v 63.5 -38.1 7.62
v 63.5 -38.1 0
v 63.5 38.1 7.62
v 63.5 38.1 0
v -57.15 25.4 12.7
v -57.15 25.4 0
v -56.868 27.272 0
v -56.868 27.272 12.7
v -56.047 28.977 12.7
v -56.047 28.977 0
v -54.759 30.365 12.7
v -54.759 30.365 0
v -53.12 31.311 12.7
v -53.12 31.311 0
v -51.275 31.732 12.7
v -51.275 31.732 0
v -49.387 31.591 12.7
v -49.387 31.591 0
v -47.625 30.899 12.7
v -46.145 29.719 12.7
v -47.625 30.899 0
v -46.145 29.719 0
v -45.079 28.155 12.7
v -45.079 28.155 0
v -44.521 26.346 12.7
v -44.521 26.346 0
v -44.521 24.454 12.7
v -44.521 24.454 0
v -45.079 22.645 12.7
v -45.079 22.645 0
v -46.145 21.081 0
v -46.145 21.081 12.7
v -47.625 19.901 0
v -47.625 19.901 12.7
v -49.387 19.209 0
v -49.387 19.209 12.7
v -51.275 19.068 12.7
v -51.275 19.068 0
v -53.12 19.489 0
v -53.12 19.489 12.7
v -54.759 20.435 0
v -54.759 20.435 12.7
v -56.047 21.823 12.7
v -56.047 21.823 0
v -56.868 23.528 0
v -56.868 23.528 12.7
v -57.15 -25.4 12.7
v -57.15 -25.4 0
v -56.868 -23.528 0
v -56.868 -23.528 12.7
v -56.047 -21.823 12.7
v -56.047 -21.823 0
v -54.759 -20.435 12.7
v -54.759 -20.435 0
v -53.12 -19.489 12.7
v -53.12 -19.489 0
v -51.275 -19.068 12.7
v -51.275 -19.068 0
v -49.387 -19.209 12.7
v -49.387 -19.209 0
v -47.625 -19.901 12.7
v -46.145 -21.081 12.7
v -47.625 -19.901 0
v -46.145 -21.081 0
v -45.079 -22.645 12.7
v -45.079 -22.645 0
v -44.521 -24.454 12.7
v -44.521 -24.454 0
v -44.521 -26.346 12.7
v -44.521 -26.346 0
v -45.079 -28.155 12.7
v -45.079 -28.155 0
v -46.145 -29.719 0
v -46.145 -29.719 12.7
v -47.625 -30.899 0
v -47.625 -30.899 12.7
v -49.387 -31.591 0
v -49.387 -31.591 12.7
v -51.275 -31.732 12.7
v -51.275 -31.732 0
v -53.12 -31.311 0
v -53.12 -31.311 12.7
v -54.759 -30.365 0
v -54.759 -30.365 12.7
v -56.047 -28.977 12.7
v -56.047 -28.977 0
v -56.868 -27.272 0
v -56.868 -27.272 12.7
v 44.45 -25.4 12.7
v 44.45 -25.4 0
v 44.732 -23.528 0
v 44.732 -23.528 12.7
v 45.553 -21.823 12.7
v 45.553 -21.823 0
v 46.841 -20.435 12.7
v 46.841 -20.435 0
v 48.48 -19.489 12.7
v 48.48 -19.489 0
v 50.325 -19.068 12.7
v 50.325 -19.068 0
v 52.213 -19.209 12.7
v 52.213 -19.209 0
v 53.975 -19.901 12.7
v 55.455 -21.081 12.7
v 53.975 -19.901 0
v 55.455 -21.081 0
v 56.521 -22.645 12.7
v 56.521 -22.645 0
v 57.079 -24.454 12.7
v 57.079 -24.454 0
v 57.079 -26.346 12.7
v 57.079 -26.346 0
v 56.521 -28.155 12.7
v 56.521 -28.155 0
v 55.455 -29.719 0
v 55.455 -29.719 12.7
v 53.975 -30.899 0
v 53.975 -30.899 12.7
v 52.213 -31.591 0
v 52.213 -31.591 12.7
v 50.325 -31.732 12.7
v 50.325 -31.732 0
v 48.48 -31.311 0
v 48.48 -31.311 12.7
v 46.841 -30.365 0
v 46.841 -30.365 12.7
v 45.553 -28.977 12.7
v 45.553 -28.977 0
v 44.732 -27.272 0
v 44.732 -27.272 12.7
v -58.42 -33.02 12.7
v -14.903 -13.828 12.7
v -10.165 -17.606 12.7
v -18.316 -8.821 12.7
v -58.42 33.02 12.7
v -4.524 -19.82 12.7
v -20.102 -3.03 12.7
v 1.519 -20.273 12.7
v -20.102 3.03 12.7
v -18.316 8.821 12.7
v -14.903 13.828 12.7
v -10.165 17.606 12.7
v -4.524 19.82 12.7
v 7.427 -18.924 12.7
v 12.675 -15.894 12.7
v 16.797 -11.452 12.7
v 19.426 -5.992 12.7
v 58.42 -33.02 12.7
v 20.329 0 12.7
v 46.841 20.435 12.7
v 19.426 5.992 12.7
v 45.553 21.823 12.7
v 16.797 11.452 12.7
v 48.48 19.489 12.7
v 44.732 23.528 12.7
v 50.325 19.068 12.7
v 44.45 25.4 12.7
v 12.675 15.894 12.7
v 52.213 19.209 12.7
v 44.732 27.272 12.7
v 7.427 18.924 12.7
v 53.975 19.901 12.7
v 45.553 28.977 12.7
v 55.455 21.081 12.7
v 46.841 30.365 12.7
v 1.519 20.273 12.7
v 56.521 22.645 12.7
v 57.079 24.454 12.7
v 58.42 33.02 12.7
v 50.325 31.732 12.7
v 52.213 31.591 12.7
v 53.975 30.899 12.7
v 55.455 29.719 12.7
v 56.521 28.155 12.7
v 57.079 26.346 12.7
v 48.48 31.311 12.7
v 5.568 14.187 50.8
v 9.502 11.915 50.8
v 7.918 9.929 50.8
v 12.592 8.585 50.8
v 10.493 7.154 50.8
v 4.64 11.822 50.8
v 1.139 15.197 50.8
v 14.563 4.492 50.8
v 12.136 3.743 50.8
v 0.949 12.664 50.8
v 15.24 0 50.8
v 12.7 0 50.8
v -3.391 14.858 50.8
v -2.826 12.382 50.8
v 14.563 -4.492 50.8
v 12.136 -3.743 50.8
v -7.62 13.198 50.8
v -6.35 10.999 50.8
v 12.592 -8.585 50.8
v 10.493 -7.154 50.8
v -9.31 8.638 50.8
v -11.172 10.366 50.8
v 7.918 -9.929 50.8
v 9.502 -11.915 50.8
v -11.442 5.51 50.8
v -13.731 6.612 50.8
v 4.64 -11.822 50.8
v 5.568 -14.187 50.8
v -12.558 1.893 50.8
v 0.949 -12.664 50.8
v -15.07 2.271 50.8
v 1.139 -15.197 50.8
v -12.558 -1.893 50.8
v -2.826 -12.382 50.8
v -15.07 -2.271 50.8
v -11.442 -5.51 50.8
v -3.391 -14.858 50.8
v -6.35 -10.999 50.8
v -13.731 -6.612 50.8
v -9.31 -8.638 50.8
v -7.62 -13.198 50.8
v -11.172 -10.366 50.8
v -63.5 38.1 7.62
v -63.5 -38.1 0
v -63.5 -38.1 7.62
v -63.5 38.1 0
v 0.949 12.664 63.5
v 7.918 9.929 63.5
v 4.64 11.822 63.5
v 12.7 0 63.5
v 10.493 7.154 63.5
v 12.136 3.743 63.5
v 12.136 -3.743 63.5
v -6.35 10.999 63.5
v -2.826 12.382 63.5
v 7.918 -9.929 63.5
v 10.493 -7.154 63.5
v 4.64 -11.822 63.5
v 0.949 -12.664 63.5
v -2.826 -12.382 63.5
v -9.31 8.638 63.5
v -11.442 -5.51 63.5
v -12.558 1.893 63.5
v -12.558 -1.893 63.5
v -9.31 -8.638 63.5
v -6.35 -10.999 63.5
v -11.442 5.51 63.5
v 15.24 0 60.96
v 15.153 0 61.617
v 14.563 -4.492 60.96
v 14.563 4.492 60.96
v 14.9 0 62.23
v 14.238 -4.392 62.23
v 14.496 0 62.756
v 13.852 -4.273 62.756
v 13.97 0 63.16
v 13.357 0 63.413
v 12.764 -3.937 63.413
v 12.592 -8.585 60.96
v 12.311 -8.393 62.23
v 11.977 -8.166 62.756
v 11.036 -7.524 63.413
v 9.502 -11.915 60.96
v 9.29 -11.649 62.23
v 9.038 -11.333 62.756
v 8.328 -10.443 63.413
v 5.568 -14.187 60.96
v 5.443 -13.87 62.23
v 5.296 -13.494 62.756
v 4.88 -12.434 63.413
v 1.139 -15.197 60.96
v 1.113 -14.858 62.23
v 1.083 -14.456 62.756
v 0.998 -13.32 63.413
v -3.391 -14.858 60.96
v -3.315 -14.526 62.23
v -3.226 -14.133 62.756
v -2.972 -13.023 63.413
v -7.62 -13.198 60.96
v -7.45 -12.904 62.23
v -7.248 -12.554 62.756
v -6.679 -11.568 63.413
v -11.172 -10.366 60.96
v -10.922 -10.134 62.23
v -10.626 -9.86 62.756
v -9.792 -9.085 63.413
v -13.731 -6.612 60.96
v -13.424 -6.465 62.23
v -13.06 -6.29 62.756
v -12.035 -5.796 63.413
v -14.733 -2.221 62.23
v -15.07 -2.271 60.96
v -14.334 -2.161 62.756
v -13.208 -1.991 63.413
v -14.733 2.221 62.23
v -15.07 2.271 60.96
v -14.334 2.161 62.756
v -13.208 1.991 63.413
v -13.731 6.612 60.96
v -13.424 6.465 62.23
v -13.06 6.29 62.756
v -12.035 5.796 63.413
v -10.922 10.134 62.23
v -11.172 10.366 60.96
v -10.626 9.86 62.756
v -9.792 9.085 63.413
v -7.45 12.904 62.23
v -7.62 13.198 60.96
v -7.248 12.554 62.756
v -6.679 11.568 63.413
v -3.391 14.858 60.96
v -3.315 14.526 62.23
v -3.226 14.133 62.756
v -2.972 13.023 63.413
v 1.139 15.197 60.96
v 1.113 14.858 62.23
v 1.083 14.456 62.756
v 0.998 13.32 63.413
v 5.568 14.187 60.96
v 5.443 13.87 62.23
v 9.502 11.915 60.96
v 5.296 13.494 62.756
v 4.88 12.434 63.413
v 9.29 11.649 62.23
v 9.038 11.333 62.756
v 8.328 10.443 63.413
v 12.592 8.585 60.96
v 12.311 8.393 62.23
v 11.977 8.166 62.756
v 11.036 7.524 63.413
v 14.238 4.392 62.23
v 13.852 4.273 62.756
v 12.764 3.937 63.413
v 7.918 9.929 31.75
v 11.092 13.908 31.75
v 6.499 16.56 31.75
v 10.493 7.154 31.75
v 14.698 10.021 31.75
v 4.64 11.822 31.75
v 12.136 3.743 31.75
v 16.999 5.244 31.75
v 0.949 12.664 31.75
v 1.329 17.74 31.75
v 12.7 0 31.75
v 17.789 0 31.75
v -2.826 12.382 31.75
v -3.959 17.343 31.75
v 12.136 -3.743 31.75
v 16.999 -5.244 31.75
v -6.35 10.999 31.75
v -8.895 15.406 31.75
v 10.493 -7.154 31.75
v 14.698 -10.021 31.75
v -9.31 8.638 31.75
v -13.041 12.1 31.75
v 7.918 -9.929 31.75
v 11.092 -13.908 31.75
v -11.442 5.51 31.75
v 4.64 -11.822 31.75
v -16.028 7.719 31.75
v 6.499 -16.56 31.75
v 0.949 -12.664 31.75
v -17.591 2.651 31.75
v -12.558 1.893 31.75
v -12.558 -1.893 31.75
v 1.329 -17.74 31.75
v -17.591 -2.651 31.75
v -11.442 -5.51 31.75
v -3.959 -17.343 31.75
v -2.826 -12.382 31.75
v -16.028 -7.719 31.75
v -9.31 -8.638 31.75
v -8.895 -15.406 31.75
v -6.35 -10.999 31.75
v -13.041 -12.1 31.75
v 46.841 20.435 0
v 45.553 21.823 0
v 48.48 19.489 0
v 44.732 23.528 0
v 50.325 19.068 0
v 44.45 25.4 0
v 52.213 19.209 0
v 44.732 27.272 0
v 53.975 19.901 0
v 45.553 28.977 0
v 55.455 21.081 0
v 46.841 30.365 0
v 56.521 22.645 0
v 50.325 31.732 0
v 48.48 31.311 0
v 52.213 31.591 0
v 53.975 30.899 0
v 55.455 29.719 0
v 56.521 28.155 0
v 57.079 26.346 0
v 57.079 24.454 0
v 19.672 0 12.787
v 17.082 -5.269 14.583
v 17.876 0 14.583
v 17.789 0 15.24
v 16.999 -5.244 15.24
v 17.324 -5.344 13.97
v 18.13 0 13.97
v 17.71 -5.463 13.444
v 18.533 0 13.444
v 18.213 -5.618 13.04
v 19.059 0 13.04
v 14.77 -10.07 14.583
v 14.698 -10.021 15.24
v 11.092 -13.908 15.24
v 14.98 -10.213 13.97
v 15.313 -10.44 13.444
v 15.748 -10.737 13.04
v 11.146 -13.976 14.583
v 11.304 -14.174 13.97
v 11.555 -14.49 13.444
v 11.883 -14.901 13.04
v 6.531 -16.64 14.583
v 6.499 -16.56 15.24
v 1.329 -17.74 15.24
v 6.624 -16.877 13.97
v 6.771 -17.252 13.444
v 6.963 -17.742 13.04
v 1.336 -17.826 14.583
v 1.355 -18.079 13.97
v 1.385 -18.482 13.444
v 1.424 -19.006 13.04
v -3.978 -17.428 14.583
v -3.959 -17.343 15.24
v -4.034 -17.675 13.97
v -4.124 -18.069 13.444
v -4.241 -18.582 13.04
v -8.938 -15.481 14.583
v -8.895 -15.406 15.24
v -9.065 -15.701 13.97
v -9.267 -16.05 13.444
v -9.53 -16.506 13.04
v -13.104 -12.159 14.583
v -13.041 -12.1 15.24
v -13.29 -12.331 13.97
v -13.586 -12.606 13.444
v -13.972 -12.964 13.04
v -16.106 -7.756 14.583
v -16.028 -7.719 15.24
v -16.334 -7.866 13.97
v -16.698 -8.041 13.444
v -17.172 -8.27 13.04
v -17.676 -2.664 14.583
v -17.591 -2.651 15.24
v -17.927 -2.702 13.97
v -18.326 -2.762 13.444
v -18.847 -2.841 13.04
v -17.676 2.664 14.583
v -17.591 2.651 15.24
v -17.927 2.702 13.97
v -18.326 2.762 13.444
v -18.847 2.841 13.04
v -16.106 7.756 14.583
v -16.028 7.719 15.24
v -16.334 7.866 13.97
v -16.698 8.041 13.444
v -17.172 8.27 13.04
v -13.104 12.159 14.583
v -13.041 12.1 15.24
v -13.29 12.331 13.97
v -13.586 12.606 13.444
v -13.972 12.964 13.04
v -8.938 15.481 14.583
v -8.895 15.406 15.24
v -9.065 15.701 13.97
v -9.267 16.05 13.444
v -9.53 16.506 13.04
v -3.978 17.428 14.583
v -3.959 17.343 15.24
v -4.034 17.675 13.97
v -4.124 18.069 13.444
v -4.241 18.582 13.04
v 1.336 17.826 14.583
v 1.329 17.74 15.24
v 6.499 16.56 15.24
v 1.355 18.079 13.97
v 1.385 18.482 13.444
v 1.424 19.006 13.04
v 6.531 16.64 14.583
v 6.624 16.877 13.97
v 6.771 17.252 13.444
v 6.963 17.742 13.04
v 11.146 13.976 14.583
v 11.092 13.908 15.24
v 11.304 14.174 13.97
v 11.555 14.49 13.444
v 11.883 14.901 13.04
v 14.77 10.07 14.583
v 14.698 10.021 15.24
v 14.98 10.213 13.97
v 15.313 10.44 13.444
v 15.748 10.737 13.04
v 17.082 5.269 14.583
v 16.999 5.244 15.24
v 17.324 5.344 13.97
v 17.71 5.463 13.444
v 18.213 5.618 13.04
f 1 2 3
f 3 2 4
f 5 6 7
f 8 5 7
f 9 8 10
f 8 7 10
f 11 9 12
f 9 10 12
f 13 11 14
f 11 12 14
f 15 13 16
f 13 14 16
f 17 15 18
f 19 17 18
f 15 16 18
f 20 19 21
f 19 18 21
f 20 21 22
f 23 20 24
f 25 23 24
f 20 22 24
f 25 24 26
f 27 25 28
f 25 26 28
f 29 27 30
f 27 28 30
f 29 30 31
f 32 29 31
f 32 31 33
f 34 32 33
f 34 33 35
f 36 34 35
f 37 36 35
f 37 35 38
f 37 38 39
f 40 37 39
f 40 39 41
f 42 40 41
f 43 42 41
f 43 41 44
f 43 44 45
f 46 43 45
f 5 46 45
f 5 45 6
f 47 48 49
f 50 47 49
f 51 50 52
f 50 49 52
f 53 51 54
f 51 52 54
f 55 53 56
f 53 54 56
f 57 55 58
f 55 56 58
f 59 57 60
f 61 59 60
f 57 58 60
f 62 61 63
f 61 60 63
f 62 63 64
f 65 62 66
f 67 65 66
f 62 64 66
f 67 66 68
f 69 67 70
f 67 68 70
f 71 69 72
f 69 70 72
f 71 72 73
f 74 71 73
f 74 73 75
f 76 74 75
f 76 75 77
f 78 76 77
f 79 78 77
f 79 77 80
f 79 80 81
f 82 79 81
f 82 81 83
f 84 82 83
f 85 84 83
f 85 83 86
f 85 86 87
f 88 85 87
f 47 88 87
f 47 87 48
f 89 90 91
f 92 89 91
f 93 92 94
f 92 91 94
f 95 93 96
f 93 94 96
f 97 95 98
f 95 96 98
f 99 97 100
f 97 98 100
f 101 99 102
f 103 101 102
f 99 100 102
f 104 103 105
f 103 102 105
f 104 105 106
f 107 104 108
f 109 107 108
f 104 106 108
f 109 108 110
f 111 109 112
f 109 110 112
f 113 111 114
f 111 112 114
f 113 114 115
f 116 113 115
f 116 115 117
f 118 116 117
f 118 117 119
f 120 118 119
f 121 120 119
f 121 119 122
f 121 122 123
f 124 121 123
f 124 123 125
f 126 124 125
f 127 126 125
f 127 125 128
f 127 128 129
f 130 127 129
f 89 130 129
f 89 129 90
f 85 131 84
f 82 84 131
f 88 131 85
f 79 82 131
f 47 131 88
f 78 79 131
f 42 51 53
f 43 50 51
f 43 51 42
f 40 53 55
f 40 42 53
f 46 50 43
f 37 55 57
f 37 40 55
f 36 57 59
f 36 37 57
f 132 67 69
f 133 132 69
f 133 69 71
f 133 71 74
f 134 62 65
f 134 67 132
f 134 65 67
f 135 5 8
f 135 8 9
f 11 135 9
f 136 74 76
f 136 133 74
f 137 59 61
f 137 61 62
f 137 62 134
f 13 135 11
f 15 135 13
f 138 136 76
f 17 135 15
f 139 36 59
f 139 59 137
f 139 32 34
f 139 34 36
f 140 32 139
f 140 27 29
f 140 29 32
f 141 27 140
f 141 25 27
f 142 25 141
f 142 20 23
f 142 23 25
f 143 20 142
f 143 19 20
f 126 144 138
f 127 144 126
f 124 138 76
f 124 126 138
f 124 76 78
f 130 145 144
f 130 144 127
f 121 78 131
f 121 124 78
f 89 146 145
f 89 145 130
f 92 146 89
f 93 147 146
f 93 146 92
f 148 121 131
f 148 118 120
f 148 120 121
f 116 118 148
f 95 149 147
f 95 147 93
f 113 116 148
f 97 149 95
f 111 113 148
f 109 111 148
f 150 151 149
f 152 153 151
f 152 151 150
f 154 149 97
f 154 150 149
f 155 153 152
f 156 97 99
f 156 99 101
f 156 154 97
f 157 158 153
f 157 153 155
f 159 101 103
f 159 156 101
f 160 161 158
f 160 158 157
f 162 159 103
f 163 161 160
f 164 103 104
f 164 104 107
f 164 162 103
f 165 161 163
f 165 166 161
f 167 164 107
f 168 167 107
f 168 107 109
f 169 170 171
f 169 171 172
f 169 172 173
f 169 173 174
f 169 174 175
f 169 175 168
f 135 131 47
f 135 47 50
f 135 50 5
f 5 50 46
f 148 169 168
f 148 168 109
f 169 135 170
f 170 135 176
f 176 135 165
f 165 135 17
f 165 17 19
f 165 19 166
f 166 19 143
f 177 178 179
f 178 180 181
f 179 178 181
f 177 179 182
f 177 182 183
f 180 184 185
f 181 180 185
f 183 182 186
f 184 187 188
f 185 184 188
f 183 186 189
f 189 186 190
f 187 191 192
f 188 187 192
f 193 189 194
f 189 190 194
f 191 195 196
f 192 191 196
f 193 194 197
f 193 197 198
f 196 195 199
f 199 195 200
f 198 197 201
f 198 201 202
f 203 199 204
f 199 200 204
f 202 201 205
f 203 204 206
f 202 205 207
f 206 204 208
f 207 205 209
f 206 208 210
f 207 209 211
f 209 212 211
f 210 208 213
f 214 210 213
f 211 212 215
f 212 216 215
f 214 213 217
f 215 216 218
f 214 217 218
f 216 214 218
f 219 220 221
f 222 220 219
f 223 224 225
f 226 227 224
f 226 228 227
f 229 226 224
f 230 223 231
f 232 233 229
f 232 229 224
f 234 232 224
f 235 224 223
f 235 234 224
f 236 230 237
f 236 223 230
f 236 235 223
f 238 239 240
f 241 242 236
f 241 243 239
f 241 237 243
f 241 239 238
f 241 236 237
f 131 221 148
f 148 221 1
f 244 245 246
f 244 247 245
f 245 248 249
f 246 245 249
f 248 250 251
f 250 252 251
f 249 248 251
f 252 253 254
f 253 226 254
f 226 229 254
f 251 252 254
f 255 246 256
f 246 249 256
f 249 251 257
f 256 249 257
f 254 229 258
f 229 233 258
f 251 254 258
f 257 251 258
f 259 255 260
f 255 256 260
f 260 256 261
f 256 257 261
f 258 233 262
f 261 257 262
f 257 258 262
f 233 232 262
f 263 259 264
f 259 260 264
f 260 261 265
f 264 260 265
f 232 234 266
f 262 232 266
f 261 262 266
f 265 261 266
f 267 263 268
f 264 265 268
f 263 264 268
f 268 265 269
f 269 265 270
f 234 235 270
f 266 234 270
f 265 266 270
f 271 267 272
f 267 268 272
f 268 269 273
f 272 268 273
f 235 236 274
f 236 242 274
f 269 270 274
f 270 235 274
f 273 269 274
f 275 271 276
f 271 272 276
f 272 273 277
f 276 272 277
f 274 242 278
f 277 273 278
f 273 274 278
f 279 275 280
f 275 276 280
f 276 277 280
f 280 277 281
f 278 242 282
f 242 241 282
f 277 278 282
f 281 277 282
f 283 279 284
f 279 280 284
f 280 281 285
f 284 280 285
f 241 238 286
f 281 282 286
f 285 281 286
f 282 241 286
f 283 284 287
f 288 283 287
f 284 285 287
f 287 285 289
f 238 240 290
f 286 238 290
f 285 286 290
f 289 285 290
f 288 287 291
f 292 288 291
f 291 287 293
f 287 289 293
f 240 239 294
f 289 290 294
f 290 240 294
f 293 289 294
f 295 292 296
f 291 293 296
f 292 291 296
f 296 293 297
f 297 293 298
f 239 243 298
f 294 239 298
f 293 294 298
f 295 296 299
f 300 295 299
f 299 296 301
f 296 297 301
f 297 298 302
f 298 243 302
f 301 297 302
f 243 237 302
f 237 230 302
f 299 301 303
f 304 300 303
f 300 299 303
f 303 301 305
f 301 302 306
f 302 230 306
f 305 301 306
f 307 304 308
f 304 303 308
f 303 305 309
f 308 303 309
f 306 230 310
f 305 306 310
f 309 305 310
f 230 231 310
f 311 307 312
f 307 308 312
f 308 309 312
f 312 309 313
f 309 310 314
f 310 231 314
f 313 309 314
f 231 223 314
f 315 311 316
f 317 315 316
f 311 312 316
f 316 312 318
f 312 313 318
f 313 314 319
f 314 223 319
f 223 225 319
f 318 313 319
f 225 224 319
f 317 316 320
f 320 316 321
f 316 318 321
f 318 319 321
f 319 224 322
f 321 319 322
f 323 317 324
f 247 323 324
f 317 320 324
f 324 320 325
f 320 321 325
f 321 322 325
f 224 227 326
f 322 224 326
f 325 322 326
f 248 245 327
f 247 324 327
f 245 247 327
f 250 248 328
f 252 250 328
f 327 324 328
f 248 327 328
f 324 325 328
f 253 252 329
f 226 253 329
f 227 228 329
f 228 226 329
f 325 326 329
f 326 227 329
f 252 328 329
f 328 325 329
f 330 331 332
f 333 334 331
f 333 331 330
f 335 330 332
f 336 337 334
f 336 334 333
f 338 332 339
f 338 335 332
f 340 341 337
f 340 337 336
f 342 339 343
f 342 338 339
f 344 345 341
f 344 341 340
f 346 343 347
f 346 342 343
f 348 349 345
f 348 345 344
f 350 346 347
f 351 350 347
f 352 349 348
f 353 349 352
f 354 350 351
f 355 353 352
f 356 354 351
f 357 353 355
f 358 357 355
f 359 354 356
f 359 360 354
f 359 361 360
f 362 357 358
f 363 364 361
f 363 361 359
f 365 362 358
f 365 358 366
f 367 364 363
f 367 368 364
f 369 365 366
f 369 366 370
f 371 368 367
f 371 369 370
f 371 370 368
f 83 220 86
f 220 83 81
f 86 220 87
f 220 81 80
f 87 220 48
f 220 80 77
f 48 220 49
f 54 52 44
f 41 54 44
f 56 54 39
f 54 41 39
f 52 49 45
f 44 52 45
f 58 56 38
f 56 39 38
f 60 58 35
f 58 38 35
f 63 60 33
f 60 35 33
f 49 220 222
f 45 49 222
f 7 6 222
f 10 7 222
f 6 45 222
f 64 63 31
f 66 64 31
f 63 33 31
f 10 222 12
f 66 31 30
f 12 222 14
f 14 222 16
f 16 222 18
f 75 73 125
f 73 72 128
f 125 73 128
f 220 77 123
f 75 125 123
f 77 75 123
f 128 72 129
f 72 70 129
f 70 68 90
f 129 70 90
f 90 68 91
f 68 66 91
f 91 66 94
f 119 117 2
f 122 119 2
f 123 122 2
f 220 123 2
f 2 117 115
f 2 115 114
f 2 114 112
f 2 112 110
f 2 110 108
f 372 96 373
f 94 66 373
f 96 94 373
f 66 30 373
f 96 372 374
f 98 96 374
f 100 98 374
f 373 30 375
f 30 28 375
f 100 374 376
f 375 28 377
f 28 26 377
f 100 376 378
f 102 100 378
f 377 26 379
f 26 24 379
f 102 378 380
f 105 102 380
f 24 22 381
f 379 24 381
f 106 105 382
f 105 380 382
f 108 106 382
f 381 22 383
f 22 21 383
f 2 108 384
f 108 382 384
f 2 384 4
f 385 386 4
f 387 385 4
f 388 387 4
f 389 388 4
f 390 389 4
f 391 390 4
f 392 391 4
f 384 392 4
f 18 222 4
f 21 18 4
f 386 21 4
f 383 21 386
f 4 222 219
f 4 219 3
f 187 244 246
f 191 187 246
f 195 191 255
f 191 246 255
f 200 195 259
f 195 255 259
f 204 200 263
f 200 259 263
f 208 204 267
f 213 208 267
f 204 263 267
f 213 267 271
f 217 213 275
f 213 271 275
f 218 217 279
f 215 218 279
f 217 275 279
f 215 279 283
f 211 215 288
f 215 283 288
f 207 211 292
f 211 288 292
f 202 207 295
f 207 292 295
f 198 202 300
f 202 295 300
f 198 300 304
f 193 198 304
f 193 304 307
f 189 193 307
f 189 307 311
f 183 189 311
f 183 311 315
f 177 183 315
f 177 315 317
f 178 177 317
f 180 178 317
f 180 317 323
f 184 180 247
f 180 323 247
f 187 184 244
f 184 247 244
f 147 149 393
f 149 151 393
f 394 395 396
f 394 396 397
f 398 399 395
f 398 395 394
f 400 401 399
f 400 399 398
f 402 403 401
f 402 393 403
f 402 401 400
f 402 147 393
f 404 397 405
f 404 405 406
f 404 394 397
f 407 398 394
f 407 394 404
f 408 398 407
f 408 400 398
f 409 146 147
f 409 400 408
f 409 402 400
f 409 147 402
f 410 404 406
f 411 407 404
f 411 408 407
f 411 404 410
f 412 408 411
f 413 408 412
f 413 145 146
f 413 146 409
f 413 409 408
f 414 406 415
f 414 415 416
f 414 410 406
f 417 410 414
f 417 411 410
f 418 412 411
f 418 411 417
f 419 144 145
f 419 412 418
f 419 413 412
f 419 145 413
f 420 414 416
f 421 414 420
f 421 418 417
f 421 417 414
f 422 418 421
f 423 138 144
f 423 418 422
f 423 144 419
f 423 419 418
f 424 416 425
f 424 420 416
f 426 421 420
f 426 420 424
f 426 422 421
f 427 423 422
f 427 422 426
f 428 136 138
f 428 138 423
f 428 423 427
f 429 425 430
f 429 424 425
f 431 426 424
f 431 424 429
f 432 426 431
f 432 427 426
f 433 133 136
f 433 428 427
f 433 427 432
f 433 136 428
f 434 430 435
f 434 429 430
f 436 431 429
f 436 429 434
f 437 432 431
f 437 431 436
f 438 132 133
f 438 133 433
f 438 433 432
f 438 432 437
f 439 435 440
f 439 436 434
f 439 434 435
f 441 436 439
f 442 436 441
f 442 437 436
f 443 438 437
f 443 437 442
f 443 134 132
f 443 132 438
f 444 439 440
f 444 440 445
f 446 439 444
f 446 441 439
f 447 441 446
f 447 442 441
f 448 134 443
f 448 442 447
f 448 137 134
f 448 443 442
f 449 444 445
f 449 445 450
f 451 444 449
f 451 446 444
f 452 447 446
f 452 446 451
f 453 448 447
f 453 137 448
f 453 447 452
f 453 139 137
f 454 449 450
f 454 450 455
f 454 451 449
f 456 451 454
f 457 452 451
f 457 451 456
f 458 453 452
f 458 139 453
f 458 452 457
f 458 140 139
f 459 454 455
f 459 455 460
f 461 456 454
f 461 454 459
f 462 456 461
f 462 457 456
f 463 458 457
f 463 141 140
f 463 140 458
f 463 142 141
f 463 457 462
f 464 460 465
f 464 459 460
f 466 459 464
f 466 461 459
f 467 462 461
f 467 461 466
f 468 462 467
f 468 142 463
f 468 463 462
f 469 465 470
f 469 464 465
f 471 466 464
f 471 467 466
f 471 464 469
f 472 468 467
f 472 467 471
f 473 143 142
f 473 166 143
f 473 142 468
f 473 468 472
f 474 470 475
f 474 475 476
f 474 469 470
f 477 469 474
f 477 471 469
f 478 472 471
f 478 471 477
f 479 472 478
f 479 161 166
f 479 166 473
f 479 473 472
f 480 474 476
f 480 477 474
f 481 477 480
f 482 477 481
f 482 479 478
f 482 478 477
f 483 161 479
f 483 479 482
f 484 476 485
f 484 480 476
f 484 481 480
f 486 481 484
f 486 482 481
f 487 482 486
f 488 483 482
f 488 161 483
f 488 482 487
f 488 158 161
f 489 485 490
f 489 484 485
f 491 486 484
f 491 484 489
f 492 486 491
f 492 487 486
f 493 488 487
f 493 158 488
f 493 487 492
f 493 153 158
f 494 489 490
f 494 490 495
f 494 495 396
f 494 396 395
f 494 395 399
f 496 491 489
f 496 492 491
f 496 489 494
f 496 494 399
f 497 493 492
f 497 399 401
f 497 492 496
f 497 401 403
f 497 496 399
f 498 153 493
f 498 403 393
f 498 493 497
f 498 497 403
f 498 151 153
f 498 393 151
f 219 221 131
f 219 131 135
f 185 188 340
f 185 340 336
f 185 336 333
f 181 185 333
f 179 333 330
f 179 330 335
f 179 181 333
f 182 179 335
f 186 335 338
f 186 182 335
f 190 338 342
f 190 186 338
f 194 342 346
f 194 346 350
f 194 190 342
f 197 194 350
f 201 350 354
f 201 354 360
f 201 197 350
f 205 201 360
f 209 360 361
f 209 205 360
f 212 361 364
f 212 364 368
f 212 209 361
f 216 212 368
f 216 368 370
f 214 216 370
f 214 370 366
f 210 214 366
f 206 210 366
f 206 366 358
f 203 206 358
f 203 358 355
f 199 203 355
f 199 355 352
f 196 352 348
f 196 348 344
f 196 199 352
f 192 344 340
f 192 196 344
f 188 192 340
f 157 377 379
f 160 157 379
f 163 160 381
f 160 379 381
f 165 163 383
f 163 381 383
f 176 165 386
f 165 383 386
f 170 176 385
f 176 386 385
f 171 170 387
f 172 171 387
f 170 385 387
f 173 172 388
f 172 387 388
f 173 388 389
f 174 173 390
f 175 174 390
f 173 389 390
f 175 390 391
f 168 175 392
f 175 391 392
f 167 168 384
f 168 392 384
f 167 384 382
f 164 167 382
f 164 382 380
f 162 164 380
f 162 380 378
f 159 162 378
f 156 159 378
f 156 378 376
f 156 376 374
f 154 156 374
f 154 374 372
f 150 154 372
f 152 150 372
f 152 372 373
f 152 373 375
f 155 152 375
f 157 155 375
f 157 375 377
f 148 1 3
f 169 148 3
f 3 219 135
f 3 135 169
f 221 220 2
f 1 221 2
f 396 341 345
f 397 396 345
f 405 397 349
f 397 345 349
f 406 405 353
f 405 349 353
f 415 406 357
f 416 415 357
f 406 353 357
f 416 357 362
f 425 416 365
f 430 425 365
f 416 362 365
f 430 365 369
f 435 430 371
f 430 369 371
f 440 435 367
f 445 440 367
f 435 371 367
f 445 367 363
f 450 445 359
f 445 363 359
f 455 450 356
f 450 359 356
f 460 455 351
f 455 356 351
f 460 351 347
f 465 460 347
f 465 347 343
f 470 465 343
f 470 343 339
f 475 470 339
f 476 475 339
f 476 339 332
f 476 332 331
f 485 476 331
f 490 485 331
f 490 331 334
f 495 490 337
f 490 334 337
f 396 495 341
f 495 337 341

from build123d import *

# Parameters (mm, degrees)
F0_W     = 127
F0_H     = 76.2
F1_DEPTH = 12.7
F3_D     = 12.7
F5_D     = 12.7
F7_D     = 12.7
F9_D     = 12.7
F10_W    = 12.7
F10_H    = 50.8
F12_W    = 17.789466
F12_H    = 19.05
F14_W    = 15.24
F14_H    = 12.7
F16_R    = 2.54
F17_SIZE = 5.08


with BuildPart() as f1:
    # F0 (on Top) → F1 (new body)
    with BuildSketch(Plane.XY):
        Rectangle(F0_W, F0_H)
    extrude(amount=F1_DEPTH)

    # F3 (through all)
    with Locations(Plane.XY.offset(12.7)):
        with Locations((-50.8, 25.4)):
            Hole(F3_D / 2)

    # F5 (through all)
    with Locations(Plane.XY.offset(12.7)):
        with Locations((50.8, 25.4)):
            Hole(F5_D / 2)

    # F7 (through all)
    with Locations(Plane.XY.offset(12.7)):
        with Locations((-50.8, -25.4)):
            Hole(F7_D / 2)

    # F9 (through all)
    with Locations(Plane.XY.offset(12.7)):
        with Locations((50.8, -25.4)):
            Hole(F9_D / 2)

    # F10 (on Front) → F11 (revolve)
    with BuildSketch(Plane.XZ):
        with Locations((6.35, 38.1)):
            Rectangle(F10_W, F10_H)
    revolve(axis=Axis((0, 0, 38.1), (0, 0, 1)))

    # F12 (on Front) → F13 (revolve)
    with BuildSketch(Plane.XZ):
        with Locations((8.894733, 22.225)):
            Rectangle(F12_W, F12_H)
    revolve(axis=Axis((0, 0, 22.225), (0, 0, -1)))

    # F14 (on Front) → F15 (revolve)
    with BuildSketch(Plane.XZ):
        with Locations((7.62, 57.15)):
            Rectangle(F14_W, F14_H)
    revolve(axis=Axis((0, 0, 57.15), (0, 0, -1)))

    # F16
    f16_edges = [f1.edges().sort_by_distance(p)[0] for p in [
        (-15.24, 0, 63.5),
        (-17.789466, 0, 12.7),
    ]]
    fillet(f16_edges, radius=F16_R)

    # F17
    f17_edges = [f1.edges().sort_by_distance(p)[0] for p in [
        (-63.5, 0, 12.7),
        (63.5, 0, 12.7),
        (0, -38.1, 12.7),
        (0, 38.1, 12.7),
    ]]
    chamfer(f17_edges, length=F17_SIZE)


solid = f1.part
